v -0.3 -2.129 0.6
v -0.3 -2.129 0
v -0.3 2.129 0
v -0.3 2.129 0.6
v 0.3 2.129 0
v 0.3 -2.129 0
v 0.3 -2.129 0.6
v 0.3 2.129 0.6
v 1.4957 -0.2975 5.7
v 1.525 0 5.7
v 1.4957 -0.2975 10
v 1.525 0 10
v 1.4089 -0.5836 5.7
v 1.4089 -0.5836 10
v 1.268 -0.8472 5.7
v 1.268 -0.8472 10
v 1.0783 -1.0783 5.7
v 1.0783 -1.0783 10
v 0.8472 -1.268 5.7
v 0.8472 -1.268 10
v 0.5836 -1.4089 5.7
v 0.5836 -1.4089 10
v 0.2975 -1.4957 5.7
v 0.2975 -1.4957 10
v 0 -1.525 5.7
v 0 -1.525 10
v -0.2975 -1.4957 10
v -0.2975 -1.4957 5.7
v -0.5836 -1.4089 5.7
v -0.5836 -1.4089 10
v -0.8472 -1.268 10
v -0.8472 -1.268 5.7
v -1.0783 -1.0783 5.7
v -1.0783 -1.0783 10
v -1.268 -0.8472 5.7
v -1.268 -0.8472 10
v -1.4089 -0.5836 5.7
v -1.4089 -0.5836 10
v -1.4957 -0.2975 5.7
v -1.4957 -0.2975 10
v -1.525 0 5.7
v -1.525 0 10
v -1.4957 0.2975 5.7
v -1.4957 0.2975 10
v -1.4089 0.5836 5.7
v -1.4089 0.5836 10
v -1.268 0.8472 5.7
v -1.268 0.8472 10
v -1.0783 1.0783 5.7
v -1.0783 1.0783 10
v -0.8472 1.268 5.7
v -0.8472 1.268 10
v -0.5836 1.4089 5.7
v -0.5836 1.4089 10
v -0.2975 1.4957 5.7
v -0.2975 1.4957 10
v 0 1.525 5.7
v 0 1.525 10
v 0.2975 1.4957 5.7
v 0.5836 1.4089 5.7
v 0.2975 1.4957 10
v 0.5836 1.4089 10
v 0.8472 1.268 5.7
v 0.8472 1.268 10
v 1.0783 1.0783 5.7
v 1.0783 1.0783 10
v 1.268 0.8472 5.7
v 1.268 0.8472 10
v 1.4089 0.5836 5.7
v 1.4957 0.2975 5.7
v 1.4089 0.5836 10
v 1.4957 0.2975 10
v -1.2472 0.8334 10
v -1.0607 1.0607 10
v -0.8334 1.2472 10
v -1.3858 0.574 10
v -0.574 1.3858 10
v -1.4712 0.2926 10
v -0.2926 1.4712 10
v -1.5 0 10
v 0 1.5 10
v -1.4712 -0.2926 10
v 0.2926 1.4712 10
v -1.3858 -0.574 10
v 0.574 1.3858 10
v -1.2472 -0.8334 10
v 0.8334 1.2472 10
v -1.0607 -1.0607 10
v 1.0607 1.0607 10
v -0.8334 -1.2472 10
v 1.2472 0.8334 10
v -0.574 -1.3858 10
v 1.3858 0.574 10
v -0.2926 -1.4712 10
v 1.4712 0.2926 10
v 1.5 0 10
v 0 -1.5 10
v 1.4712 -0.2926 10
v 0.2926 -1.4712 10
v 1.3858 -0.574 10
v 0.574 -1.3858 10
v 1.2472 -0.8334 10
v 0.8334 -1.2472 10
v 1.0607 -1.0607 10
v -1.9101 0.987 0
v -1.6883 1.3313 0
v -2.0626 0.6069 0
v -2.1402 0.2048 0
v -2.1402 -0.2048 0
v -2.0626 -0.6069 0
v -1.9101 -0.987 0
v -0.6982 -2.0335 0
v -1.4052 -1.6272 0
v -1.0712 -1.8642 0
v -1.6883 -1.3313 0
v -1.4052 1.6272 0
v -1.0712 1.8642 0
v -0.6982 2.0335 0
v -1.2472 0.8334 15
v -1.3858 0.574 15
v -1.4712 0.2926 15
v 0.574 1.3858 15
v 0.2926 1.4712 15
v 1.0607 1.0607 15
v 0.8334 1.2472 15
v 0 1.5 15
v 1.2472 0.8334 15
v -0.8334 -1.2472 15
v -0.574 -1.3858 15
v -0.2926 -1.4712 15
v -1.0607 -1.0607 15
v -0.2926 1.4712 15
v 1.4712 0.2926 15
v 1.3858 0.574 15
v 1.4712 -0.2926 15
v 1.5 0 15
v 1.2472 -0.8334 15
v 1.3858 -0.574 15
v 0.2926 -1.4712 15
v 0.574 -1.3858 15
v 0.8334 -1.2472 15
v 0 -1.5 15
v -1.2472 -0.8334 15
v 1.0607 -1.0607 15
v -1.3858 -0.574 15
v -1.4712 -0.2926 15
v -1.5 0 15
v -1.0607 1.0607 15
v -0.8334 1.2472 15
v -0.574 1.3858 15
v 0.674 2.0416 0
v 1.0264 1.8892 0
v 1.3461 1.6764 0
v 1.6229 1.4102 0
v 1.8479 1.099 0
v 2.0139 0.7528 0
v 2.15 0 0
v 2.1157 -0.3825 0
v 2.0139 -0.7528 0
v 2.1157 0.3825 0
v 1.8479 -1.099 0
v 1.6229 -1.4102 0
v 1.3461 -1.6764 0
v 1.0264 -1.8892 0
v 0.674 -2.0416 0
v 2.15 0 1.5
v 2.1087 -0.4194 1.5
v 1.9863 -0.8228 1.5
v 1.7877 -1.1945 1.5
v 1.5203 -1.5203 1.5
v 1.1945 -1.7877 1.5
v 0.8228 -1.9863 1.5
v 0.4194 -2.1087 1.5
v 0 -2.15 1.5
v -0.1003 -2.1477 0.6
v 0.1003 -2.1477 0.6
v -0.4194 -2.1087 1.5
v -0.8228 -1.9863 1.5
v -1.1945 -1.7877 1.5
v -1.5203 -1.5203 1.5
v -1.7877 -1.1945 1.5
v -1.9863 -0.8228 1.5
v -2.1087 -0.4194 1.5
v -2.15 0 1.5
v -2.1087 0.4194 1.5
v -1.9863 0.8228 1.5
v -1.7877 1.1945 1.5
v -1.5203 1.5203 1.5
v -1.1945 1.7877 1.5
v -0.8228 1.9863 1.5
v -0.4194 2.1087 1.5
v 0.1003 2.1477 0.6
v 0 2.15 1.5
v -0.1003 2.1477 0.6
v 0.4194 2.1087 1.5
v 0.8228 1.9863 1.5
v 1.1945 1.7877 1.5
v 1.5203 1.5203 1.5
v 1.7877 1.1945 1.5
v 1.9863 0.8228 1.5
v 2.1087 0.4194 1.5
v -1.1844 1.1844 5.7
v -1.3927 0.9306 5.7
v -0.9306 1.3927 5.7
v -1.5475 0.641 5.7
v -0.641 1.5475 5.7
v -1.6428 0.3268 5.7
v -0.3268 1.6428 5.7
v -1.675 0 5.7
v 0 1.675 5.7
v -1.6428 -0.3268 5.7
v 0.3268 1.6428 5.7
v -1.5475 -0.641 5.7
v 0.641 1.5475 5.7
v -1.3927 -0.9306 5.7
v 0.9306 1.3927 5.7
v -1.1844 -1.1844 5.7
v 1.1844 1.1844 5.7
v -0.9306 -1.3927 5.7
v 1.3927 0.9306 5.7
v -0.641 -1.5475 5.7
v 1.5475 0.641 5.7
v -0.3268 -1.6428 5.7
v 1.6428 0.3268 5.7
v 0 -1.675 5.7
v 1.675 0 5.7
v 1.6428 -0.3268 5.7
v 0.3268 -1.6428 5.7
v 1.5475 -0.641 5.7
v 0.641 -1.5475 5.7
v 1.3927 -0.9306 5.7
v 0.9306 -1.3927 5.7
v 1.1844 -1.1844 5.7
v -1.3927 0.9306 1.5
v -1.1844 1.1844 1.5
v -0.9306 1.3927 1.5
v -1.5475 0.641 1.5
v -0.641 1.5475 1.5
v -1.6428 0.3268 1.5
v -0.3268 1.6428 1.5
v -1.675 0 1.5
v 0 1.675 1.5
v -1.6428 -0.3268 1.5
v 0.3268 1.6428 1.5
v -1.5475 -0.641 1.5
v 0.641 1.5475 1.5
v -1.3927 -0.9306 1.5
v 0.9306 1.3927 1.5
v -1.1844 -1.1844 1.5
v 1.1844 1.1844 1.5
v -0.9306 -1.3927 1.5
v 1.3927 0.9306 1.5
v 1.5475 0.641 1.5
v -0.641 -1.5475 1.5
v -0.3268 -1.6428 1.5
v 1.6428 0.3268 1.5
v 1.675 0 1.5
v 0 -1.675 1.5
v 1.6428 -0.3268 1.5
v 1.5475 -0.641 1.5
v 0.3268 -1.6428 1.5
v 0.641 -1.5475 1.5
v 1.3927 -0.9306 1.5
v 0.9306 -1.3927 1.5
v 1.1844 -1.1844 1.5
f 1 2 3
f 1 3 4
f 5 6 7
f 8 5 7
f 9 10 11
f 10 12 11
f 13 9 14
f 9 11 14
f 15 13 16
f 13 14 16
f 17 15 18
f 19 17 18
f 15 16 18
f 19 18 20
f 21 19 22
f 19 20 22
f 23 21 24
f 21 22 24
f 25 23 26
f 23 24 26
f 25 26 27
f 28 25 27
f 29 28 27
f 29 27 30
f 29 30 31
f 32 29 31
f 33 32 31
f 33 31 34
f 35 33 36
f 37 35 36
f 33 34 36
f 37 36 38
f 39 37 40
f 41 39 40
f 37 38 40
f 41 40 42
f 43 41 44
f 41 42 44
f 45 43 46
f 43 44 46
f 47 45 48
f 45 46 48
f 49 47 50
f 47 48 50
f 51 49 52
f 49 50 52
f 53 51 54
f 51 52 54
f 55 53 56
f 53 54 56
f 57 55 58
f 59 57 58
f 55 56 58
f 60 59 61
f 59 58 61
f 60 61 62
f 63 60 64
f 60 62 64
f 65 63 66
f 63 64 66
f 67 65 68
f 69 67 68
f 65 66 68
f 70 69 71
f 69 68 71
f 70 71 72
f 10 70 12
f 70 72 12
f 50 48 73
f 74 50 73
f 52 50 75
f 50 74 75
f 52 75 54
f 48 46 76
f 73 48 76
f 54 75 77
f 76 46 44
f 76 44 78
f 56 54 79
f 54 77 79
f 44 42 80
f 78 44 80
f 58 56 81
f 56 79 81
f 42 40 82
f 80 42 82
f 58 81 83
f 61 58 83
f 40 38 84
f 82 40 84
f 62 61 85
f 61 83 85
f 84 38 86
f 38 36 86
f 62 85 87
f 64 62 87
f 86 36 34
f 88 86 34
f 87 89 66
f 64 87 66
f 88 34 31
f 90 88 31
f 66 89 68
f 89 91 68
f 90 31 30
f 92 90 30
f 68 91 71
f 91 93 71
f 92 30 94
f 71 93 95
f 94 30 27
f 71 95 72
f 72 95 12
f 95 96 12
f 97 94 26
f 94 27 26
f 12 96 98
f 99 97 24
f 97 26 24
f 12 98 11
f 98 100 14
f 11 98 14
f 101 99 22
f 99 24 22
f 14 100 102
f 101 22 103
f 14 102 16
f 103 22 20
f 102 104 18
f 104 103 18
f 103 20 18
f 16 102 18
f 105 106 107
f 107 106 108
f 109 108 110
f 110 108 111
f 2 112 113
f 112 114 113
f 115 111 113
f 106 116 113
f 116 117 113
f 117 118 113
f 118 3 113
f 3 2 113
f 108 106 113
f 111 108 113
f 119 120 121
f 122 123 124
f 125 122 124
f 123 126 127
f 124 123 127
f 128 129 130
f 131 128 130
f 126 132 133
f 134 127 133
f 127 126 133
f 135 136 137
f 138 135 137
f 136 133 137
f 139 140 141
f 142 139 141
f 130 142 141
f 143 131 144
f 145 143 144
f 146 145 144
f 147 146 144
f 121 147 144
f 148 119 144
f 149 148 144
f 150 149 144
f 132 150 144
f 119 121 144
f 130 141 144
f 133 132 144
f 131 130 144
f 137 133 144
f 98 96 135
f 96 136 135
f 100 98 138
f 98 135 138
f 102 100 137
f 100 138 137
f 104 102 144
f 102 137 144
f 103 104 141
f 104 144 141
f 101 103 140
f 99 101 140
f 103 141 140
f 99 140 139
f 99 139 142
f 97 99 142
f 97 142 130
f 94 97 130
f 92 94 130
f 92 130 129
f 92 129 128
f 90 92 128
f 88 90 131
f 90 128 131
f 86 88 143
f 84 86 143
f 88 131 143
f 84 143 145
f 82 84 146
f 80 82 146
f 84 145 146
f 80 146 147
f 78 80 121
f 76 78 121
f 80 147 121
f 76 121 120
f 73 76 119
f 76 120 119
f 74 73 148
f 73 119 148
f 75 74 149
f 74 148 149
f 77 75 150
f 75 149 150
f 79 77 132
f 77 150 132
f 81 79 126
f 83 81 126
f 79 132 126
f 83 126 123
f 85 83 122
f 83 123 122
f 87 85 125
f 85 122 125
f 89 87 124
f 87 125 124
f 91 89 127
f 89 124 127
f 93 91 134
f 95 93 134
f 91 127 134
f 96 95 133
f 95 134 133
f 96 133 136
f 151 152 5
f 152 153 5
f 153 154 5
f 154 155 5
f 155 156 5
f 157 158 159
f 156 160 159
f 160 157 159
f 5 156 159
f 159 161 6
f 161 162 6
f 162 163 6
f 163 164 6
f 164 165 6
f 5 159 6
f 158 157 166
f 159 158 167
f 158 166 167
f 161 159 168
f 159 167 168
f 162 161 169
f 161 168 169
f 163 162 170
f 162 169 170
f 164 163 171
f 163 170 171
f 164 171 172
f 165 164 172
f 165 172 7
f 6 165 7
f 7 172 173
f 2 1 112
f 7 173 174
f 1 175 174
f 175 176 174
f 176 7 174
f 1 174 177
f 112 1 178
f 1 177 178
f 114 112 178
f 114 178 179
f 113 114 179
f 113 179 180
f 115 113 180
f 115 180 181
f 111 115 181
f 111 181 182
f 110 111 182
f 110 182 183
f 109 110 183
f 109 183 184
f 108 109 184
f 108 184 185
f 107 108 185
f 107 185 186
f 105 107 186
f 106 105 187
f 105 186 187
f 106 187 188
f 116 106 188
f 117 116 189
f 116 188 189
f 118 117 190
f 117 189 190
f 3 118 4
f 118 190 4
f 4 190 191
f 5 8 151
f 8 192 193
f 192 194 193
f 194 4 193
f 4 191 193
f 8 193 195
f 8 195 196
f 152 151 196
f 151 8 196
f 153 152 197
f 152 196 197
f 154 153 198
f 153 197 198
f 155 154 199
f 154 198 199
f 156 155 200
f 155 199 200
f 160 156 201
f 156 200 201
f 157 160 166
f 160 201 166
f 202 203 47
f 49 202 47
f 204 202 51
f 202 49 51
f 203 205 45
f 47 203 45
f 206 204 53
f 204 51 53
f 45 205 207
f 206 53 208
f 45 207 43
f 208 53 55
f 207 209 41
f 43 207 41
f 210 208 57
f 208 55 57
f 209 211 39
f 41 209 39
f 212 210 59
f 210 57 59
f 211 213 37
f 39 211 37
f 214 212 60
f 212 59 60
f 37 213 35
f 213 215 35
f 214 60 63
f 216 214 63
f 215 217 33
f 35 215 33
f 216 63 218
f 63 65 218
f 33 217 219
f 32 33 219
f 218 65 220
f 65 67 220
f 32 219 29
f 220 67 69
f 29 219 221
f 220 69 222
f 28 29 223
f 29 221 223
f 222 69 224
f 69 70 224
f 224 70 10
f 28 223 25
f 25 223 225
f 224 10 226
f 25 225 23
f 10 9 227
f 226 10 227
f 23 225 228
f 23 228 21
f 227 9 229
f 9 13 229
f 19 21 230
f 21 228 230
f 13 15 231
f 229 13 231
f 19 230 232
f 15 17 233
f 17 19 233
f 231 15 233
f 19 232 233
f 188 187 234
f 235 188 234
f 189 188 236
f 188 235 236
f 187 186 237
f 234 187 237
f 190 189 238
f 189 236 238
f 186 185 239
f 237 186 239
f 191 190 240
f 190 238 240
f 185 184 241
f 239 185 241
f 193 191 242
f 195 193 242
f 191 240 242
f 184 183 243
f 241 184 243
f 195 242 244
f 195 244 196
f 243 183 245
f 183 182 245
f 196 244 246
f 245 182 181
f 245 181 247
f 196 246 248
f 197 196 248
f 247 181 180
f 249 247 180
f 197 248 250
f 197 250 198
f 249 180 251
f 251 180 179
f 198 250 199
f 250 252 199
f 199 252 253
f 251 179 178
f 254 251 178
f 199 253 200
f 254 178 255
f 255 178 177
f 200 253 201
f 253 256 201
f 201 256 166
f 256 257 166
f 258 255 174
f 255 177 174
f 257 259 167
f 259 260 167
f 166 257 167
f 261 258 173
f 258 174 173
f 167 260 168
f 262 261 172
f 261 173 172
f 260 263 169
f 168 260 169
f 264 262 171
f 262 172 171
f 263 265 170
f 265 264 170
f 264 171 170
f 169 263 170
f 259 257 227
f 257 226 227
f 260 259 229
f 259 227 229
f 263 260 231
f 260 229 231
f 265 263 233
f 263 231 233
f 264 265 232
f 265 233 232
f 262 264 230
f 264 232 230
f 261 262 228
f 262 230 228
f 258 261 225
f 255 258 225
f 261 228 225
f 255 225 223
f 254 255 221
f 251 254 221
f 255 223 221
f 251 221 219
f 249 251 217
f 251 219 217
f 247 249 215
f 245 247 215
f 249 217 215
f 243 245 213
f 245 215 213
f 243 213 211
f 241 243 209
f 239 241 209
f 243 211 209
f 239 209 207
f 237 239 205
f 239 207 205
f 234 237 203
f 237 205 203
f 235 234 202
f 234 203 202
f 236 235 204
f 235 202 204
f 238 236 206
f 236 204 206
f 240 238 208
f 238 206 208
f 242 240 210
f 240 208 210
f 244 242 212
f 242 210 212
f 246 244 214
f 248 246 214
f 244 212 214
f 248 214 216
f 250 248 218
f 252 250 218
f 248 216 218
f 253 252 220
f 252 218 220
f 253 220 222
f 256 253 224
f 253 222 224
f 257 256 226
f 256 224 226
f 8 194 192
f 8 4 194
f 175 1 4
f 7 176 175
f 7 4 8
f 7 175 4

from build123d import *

# Parameters (mm, degrees)
F2_W          = 0.6
F2_H          = 0.6
F3_DEPTH      = 2.151
F3_DEPTH_BACK = 2.151


with BuildPart() as f1:
    # F0 (on Front) → F1 (revolve)
    with BuildSketch(Plane.XZ):
        Polygon((0, 15), (0, 0), (2.15, 0), (2.15, 1.5), (1.675, 1.5), (1.675, 5.7), (1.525, 5.7), (1.525, 10), (1.5, 10), (1.5, 15), align=None)
    revolve(axis=Axis((0, 0, 8.8781863451), (0, 0, -1)))

    # F2 (on Front) → F3 (cut, two sides)
    with BuildSketch(Plane.XZ) as f3_sk:
        with Locations((0, 0.3)):
            Rectangle(F2_W, F2_H)
    extrude(amount=-F3_DEPTH, mode=Mode.SUBTRACT)
    extrude(f3_sk.sketch, amount=F3_DEPTH_BACK, mode=Mode.SUBTRACT)


solid = f1.part
